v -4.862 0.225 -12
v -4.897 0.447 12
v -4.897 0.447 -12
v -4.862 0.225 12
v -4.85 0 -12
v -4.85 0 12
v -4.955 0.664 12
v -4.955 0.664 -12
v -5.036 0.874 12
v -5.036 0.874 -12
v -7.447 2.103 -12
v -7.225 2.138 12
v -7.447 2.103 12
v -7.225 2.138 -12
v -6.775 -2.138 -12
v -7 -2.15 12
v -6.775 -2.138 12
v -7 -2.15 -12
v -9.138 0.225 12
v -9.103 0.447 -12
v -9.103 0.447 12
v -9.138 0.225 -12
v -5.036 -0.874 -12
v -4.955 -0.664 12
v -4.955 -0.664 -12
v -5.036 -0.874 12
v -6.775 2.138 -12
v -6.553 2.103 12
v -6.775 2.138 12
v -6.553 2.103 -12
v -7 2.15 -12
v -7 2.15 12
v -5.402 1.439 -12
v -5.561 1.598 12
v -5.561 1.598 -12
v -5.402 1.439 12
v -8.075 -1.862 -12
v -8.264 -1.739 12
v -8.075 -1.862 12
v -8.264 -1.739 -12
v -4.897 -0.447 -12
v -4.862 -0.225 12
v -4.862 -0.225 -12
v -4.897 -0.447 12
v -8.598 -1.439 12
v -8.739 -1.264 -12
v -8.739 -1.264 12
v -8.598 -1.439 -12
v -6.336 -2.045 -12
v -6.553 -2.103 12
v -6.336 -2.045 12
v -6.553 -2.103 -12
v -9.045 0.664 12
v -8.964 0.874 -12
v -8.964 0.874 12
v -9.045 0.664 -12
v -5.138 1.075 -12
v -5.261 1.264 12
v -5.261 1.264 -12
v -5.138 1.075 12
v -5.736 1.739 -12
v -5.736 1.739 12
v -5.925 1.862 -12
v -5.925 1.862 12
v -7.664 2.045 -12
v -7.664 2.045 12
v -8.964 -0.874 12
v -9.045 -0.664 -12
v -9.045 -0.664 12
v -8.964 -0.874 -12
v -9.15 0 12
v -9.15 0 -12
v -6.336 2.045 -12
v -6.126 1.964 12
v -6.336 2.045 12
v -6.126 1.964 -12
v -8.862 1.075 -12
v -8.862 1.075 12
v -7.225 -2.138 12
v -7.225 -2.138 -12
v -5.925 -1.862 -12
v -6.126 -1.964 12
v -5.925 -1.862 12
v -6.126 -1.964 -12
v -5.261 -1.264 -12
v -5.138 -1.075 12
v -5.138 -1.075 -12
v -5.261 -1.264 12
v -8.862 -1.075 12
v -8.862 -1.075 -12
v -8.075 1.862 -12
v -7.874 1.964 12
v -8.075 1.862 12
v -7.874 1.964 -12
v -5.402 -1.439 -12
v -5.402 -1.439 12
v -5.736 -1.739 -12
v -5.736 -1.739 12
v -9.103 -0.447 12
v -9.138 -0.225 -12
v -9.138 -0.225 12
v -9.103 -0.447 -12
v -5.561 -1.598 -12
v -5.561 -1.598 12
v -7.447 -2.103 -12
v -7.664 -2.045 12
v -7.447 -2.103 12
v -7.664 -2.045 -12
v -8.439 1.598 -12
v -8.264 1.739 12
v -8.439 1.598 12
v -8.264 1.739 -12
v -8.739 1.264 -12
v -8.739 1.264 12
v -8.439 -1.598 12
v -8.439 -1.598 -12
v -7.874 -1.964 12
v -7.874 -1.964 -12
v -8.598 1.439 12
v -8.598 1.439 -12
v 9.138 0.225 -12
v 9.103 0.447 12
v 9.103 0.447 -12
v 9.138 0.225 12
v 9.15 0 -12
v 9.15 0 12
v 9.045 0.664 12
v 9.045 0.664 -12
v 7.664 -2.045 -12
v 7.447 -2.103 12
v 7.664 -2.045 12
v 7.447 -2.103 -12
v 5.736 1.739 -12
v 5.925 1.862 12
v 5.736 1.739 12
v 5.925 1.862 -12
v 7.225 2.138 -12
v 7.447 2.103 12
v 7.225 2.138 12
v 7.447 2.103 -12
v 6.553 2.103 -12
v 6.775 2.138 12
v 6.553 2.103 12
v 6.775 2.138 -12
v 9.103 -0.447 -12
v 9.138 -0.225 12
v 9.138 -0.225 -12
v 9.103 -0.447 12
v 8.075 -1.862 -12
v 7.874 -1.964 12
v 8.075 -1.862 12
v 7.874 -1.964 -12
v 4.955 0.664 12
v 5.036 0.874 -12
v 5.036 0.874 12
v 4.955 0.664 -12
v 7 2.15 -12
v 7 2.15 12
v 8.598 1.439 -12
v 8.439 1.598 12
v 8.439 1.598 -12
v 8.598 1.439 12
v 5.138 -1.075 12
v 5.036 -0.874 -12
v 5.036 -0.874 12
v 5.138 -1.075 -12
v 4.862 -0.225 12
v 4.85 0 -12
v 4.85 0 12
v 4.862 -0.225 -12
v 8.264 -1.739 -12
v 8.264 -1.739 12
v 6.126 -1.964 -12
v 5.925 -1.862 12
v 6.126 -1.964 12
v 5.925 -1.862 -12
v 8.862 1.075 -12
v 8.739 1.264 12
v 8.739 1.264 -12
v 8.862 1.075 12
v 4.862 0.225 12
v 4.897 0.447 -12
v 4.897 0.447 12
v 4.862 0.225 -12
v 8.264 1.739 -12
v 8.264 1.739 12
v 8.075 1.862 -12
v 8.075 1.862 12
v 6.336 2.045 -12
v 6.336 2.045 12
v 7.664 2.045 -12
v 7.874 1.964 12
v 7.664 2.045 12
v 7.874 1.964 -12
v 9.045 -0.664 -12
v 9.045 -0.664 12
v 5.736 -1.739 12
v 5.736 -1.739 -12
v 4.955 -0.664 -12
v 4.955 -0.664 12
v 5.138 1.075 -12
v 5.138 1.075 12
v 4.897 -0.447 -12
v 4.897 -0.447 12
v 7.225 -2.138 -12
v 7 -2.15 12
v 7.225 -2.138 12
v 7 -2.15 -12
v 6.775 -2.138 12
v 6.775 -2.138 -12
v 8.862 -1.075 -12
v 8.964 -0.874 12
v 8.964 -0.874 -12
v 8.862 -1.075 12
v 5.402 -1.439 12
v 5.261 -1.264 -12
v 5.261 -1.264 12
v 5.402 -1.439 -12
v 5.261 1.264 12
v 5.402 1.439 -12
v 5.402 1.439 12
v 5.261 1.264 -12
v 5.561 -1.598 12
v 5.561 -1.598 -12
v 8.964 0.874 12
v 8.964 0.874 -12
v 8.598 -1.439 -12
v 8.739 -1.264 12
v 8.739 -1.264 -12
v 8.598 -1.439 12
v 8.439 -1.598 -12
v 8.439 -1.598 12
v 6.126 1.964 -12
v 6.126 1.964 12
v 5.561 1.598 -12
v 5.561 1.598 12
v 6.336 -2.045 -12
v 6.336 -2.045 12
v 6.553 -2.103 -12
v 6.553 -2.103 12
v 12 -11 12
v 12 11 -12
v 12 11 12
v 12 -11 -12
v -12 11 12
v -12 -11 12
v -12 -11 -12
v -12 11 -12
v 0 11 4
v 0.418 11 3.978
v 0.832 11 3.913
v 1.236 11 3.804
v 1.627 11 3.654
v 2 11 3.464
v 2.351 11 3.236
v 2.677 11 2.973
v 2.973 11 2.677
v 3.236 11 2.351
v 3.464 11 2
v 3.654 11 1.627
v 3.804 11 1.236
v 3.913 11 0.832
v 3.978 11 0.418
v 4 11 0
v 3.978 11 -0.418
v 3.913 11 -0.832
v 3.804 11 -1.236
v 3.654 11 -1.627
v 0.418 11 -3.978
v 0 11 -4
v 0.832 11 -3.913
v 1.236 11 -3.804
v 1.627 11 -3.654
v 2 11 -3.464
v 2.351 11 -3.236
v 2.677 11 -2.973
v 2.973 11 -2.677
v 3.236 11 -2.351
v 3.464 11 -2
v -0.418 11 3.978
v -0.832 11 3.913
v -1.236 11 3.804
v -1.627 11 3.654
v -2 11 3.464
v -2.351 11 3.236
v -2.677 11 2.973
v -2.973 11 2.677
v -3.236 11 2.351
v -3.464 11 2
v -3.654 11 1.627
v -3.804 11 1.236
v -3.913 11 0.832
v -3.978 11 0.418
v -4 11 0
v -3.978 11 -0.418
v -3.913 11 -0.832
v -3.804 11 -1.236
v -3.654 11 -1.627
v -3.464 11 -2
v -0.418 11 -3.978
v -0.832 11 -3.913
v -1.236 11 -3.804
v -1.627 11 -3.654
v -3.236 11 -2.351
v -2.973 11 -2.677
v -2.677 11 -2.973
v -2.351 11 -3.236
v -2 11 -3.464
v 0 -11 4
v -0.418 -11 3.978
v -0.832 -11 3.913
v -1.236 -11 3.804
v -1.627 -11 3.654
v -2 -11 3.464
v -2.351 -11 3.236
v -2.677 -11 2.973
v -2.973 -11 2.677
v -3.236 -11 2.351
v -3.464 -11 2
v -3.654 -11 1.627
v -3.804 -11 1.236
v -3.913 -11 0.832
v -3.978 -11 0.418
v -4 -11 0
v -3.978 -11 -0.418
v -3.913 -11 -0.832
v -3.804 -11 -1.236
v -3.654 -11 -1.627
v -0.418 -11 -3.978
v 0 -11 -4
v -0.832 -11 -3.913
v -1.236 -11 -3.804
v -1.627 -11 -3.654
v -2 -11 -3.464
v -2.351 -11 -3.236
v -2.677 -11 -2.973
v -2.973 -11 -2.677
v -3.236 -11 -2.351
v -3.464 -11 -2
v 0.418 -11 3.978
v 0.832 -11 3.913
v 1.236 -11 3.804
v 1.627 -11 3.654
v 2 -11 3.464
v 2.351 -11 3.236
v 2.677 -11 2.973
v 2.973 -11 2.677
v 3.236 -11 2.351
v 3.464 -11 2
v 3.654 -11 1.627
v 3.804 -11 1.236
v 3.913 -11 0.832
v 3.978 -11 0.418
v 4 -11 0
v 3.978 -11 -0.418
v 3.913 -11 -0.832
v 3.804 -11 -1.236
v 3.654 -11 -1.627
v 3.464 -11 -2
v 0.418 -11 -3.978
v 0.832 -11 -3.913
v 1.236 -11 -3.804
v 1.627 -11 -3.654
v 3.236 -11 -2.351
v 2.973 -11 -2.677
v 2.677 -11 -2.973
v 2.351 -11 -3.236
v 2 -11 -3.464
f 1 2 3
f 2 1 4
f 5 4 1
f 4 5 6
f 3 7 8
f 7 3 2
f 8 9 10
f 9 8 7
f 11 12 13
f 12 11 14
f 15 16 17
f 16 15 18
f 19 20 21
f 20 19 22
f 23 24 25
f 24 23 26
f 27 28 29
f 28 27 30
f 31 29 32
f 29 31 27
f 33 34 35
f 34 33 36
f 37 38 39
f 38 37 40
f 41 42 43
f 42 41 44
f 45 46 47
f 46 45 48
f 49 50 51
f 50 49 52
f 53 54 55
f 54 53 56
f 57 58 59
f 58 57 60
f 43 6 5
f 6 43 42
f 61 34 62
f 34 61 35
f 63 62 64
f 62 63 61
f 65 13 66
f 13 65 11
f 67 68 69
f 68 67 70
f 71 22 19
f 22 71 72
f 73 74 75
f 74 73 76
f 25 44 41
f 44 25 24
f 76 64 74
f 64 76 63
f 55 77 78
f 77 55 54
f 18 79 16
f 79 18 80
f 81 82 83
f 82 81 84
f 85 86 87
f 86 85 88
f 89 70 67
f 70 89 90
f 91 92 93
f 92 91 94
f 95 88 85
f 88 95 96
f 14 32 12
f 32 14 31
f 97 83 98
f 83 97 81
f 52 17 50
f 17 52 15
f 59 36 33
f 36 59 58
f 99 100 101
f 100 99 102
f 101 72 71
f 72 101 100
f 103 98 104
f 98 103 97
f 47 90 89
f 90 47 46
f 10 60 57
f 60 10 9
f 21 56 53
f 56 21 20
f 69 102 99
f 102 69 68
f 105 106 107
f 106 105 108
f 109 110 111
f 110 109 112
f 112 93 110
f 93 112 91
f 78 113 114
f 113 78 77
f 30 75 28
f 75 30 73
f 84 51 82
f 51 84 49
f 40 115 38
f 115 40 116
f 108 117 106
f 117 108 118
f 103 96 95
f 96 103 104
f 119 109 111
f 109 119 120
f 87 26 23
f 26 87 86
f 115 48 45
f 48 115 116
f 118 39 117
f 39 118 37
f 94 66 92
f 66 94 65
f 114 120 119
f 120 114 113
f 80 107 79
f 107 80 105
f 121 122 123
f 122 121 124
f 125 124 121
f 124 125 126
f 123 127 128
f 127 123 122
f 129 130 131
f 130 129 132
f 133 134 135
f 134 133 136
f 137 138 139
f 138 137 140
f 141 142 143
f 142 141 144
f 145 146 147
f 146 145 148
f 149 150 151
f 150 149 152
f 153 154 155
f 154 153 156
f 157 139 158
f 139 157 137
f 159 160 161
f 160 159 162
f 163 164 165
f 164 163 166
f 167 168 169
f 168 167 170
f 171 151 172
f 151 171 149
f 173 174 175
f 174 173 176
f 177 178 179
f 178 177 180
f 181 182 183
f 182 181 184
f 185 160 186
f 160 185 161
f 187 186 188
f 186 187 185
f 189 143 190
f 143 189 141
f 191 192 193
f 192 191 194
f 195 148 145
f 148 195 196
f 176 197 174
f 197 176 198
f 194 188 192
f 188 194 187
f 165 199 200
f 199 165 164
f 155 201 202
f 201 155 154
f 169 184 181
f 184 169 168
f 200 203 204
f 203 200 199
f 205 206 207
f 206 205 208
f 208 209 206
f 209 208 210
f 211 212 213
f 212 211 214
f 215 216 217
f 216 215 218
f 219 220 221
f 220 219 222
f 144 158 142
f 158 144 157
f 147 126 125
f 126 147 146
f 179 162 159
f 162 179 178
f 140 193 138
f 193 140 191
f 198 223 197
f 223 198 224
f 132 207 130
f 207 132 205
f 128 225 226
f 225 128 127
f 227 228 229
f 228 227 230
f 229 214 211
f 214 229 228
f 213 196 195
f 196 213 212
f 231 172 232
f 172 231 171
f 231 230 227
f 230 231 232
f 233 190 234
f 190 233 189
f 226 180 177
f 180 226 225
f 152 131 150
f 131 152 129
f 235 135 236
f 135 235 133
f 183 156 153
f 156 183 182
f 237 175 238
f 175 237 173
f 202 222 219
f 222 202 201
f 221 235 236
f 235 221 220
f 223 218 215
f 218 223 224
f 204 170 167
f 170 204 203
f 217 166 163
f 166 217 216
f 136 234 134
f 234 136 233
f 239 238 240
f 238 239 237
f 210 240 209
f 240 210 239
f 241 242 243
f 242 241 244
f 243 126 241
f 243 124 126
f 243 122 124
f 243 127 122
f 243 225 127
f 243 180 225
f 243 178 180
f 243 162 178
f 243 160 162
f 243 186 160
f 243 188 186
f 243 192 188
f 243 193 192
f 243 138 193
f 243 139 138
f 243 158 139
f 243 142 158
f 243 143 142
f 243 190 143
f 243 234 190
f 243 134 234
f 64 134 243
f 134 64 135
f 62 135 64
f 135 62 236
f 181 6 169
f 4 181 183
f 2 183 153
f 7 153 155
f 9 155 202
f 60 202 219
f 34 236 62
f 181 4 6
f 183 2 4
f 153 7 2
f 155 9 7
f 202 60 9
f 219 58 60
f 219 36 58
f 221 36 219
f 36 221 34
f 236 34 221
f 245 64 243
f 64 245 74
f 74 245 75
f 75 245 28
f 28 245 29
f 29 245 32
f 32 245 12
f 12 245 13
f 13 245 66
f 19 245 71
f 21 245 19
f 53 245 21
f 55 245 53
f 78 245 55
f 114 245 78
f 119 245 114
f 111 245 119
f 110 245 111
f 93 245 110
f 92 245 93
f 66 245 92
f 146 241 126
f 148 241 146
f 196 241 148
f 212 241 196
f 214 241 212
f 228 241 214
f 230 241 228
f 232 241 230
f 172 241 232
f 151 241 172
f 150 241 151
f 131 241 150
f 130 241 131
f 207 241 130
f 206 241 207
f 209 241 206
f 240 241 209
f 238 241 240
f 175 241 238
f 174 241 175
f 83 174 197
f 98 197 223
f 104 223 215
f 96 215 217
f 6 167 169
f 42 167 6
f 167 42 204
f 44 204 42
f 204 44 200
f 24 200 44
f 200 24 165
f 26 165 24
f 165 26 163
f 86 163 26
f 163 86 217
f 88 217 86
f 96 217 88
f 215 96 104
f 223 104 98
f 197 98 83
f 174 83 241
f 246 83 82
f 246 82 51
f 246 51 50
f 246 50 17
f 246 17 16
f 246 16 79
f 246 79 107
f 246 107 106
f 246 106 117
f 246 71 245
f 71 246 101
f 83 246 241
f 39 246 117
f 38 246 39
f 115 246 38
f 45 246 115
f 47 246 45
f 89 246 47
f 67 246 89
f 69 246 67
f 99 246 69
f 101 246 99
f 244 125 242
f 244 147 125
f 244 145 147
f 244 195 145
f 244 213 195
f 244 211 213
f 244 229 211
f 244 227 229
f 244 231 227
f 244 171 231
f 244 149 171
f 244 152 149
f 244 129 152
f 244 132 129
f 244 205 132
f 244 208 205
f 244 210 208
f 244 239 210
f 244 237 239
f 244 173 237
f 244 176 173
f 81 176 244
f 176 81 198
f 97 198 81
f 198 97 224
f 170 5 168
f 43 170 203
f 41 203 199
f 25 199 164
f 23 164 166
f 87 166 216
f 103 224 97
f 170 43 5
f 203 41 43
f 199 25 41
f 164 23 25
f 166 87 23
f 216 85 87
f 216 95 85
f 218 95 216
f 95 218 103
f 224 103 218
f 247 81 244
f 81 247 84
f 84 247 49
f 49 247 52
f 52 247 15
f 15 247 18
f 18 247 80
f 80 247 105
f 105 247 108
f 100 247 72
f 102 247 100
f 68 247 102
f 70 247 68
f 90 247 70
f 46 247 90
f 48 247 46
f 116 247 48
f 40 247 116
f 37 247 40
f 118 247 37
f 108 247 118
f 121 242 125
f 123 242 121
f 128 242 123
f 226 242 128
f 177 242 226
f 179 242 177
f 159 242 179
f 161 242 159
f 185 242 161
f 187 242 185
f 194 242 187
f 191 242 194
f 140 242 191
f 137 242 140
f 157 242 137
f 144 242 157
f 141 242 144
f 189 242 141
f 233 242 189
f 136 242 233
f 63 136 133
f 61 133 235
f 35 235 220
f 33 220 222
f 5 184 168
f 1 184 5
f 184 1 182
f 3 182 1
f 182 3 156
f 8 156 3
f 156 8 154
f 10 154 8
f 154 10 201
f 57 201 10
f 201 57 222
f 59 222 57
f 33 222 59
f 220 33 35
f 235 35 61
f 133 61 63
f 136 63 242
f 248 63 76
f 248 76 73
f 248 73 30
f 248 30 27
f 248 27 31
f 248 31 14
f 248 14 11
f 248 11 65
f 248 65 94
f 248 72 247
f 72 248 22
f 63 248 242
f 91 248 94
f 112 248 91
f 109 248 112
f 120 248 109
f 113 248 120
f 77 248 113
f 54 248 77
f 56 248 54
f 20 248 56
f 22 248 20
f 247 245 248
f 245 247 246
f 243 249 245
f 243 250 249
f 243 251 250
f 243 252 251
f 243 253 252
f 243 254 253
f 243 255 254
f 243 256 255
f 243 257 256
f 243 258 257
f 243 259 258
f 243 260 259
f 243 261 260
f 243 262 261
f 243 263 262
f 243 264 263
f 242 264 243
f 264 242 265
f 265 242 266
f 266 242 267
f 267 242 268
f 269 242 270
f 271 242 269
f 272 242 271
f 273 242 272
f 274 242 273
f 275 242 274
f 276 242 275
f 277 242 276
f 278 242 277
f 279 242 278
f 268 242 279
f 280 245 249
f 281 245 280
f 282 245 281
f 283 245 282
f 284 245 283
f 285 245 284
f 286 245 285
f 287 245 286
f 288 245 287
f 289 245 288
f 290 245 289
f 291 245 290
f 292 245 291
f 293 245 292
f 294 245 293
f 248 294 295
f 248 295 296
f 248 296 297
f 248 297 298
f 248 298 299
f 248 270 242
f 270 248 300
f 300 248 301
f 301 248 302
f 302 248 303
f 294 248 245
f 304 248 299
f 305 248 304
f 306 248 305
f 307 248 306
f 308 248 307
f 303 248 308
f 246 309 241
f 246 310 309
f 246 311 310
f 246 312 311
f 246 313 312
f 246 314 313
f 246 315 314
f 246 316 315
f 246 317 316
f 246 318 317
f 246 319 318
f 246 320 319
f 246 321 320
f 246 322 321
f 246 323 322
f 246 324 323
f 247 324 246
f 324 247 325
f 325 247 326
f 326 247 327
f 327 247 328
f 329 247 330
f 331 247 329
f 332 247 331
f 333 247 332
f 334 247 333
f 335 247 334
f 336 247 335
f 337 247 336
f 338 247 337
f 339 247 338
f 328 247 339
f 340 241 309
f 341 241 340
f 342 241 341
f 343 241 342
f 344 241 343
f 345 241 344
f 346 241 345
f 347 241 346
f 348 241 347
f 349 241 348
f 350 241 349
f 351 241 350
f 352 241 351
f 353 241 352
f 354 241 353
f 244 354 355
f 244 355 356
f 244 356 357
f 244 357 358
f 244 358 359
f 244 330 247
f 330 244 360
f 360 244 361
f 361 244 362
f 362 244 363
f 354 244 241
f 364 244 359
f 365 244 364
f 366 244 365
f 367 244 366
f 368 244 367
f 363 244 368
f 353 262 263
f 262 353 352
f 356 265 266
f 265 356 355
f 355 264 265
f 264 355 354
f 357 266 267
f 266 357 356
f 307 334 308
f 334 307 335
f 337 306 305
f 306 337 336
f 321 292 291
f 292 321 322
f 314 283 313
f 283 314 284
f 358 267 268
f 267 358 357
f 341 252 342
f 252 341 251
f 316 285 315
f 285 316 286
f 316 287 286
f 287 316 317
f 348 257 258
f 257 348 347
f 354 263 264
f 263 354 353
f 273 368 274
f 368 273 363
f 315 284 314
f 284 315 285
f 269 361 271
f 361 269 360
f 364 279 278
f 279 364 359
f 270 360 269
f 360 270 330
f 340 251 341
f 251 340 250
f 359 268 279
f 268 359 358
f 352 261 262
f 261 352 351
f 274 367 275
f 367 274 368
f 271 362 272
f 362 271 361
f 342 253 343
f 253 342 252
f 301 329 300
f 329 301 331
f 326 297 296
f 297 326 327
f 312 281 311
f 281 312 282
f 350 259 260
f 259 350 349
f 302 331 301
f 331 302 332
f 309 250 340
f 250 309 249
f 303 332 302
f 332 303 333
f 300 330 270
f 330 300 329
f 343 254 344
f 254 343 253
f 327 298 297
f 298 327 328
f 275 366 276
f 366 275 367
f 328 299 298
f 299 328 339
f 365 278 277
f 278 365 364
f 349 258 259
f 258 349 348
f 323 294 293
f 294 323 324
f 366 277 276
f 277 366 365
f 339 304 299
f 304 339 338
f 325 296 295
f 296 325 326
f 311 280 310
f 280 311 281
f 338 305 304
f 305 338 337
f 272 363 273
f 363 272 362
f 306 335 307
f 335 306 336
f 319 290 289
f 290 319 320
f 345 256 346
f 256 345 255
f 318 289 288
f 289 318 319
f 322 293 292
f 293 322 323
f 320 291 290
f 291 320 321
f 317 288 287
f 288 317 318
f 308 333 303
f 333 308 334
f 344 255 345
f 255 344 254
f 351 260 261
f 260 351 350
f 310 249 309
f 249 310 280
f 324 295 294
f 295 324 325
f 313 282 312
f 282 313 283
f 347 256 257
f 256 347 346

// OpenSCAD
// Linear rail stop block.
$fn = 60;
eps = 0.02;
width = 22;
height = 24;
bore_d = 8;
length = 24;
difference() {
    cube([length,width,height],center=true);
    translate([0,-width/2-eps,0]) rotate([-90,0,0]) cylinder(d=bore_d,h=width+2*eps);
    for(x=[-7,7]) translate([x,0,-height/2-eps]) cylinder(d=4.3,h=height+2*eps);
}
